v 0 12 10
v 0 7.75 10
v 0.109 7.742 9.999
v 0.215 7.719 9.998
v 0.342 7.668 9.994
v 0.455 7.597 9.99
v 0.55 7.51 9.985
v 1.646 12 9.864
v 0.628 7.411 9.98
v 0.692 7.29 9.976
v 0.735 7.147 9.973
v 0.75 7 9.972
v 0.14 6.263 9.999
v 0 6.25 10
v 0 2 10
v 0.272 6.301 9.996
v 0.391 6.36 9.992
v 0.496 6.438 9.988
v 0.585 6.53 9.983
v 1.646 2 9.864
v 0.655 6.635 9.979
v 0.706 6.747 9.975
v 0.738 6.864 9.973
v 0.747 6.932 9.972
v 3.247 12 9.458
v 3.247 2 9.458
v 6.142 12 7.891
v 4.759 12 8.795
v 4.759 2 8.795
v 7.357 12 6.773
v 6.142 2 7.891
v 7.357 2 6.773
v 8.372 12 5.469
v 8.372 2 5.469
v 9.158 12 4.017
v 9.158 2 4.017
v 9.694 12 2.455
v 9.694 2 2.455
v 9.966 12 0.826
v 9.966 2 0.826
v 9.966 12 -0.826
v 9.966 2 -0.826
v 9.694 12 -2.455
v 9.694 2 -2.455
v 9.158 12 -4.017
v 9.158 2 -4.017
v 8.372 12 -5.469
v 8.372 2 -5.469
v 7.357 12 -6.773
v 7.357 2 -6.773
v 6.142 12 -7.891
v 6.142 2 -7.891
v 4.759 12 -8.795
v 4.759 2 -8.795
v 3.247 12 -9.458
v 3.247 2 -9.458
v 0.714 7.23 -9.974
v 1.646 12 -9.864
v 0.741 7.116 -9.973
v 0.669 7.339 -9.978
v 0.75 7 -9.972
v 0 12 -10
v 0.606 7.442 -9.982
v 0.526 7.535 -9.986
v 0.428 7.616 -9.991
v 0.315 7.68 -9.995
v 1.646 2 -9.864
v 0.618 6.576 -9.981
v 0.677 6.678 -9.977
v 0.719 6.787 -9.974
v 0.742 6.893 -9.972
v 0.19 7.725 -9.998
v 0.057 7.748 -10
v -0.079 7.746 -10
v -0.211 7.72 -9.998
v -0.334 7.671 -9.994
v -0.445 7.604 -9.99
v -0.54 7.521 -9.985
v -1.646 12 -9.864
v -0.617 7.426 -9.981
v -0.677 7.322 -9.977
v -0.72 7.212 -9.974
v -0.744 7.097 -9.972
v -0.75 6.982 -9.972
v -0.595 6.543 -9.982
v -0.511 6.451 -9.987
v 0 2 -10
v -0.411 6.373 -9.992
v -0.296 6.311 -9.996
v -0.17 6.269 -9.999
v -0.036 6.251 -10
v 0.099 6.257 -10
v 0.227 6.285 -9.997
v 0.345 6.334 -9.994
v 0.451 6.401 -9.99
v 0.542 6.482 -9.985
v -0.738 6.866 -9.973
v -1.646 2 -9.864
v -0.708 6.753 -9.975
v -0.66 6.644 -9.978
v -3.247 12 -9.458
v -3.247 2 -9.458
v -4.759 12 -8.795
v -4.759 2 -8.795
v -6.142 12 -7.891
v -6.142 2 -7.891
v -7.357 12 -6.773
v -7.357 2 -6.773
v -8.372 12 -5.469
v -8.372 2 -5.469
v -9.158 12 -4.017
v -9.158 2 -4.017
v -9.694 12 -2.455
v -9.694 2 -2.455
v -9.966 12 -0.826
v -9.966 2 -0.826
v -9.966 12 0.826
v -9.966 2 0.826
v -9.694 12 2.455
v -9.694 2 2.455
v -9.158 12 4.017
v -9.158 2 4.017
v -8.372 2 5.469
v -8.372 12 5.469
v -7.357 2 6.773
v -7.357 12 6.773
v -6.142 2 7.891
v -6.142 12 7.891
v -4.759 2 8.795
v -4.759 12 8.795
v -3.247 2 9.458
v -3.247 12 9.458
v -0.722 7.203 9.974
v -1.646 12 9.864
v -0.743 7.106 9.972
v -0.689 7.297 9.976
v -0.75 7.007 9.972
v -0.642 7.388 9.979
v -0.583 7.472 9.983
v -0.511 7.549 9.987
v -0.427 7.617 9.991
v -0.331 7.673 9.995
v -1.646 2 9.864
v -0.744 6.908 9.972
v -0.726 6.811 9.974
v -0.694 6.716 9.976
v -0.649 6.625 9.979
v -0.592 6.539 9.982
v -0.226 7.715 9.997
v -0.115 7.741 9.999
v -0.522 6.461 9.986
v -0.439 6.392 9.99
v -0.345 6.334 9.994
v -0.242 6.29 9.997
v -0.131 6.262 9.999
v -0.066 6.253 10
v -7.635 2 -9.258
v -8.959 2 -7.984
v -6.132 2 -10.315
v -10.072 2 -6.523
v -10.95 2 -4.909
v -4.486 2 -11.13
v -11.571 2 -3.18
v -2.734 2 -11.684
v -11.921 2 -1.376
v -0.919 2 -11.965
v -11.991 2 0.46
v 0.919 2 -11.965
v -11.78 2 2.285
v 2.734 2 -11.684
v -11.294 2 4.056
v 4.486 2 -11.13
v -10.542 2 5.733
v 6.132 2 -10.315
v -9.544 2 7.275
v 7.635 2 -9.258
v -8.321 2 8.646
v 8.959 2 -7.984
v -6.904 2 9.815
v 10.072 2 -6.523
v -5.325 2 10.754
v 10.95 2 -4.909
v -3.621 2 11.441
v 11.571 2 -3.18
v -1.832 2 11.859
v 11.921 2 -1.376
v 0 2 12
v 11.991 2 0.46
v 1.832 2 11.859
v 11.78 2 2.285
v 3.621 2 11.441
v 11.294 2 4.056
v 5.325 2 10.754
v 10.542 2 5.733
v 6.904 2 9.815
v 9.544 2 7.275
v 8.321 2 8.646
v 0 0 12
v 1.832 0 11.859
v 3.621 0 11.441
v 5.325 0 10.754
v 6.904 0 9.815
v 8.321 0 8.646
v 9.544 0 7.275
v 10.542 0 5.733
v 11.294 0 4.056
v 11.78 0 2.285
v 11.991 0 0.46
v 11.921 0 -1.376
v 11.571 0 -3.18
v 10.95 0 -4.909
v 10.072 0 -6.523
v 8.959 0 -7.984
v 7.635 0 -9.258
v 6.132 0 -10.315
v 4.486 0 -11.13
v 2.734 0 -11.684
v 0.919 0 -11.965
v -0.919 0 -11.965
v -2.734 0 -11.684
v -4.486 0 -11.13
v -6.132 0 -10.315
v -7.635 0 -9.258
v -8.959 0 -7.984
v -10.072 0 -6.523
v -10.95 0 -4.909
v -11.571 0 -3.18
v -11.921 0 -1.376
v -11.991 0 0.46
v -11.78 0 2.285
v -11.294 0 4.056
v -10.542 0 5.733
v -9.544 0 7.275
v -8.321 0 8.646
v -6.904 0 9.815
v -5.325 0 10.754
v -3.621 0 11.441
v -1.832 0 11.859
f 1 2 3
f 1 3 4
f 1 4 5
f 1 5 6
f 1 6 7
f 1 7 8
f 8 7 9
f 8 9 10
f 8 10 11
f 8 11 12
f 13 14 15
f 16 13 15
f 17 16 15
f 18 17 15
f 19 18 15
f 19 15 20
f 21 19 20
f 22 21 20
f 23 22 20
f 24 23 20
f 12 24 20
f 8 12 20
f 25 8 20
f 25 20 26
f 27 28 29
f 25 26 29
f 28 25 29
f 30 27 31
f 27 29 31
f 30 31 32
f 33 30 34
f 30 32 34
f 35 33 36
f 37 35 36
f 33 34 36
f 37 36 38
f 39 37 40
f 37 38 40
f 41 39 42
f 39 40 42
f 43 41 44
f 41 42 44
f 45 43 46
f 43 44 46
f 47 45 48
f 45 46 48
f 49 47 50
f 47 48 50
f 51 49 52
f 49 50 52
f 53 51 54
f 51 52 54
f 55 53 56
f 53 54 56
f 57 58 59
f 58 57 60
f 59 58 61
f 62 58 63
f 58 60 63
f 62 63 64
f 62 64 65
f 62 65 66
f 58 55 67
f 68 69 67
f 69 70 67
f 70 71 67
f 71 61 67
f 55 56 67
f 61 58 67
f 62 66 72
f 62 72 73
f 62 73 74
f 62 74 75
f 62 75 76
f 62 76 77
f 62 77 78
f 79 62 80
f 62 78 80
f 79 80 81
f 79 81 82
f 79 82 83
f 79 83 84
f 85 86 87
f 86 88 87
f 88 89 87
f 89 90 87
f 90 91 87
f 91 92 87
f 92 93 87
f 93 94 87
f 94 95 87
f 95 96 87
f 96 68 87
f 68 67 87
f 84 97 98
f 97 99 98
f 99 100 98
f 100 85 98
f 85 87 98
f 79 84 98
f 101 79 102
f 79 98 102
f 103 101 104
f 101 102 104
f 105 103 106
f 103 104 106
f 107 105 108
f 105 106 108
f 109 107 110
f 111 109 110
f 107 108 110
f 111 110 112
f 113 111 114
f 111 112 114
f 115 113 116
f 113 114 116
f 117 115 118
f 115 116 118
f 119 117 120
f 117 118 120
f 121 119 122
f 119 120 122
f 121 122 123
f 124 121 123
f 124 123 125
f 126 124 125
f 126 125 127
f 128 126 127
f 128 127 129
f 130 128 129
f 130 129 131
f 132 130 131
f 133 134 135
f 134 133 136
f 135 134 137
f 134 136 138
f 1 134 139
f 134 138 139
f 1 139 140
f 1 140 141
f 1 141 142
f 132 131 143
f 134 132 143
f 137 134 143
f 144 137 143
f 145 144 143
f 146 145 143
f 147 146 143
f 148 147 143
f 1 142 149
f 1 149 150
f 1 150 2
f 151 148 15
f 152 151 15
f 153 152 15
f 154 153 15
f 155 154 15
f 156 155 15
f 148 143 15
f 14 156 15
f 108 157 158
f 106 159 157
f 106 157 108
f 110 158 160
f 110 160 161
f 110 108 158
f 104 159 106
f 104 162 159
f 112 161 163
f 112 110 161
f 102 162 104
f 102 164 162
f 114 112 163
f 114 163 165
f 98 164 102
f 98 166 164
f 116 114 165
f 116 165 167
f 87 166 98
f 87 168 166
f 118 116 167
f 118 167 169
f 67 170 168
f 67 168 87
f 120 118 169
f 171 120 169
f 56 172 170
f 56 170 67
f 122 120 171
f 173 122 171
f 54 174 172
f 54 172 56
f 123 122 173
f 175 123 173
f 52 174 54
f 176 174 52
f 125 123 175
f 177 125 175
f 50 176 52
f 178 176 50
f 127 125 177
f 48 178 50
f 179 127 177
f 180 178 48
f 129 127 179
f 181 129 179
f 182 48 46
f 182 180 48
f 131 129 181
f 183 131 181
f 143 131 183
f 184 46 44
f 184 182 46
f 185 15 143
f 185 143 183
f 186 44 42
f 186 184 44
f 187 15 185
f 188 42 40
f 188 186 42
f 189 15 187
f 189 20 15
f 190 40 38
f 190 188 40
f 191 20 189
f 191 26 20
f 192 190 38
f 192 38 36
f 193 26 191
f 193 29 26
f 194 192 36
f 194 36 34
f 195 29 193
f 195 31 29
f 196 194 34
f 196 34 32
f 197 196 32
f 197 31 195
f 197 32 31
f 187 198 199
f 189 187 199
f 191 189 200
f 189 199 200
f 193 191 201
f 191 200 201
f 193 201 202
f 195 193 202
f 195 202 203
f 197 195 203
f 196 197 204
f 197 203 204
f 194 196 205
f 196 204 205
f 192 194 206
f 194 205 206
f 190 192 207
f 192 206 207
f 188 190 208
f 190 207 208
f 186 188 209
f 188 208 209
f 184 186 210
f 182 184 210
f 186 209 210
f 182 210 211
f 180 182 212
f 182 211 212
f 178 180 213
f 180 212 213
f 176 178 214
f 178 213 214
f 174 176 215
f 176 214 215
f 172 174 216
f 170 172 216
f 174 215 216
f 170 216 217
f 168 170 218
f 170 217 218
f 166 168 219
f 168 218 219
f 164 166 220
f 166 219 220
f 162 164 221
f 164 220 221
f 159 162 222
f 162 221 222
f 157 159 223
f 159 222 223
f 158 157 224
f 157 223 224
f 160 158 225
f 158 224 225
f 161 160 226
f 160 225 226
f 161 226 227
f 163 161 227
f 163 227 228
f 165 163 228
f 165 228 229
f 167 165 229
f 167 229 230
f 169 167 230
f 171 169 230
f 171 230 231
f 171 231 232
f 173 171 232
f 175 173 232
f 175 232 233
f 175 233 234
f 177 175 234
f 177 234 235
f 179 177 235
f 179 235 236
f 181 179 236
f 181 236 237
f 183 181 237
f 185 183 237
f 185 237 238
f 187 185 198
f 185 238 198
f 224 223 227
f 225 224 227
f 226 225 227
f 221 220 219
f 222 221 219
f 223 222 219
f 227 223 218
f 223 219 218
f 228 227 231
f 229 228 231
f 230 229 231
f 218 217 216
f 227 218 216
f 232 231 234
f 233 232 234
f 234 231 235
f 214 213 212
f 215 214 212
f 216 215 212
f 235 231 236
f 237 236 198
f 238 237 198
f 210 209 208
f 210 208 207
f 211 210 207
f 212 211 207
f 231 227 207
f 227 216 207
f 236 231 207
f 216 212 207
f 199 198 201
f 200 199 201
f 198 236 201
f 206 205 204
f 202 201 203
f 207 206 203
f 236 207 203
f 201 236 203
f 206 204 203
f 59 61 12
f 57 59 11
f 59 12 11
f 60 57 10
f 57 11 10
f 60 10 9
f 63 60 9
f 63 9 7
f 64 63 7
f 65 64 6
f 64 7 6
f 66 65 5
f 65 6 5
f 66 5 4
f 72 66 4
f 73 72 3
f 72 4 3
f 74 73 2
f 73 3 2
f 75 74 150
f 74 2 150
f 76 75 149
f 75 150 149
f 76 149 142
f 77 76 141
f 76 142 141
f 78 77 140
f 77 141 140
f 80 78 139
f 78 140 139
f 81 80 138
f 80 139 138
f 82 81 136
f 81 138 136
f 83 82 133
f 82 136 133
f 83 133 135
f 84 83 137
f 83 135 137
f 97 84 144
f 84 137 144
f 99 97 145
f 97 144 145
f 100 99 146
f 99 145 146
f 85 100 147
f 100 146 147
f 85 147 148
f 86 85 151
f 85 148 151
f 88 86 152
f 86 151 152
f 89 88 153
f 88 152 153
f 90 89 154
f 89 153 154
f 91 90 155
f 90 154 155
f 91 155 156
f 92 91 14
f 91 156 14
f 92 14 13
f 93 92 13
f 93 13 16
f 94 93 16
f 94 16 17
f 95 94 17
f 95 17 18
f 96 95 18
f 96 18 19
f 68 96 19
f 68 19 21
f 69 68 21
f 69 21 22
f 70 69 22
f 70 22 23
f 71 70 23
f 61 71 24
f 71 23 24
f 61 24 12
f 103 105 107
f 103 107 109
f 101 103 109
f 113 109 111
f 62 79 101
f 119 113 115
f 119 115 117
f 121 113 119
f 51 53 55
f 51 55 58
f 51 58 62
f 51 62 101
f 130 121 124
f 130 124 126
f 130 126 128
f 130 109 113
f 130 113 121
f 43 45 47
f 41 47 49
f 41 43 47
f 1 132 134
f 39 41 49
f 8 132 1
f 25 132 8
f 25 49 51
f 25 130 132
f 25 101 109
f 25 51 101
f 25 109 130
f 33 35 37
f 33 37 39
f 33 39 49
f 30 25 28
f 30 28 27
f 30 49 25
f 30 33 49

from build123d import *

# Parameters (mm, degrees)
SKETCH_1_R          = 12
EXTRUDE_1_DEPTH     = 2
SKETCH_2_R          = 10
EXTRUDE_2_DEPTH     = 10
SKETCH_3_R          = 0.75
CUT_EXTRUDE_1_DEPTH = 30


with BuildPart() as part:
    # 草图1 → 凸台-拉伸1 (new body)
    with BuildSketch(Plane(origin=(0, 0, 0), x_dir=(1, 0, 0), z_dir=(0, 1, 0))):
        with Locations(Location((0, 0, 0), (0, 0, 270))):
            Circle(SKETCH_1_R)
    extrude(amount=EXTRUDE_1_DEPTH)

    # 草图2 → 凸台-拉伸2 (add)
    with BuildSketch(Plane(origin=(0, 2, 0), x_dir=(1, 0, 0), z_dir=(0, 1, 0))):
        with Locations(Location((0, 0, 0), (0, 0, 270))):
            Circle(SKETCH_2_R)
    extrude(amount=EXTRUDE_2_DEPTH)

    # 草图3 → 切除-拉伸1 (cut, symmetric)
    with BuildSketch(Plane.XY):
        with Locations((0, 7)):
            Circle(SKETCH_3_R)
    extrude(amount=CUT_EXTRUDE_1_DEPTH, both=True, mode=Mode.SUBTRACT)


solid = part.part
